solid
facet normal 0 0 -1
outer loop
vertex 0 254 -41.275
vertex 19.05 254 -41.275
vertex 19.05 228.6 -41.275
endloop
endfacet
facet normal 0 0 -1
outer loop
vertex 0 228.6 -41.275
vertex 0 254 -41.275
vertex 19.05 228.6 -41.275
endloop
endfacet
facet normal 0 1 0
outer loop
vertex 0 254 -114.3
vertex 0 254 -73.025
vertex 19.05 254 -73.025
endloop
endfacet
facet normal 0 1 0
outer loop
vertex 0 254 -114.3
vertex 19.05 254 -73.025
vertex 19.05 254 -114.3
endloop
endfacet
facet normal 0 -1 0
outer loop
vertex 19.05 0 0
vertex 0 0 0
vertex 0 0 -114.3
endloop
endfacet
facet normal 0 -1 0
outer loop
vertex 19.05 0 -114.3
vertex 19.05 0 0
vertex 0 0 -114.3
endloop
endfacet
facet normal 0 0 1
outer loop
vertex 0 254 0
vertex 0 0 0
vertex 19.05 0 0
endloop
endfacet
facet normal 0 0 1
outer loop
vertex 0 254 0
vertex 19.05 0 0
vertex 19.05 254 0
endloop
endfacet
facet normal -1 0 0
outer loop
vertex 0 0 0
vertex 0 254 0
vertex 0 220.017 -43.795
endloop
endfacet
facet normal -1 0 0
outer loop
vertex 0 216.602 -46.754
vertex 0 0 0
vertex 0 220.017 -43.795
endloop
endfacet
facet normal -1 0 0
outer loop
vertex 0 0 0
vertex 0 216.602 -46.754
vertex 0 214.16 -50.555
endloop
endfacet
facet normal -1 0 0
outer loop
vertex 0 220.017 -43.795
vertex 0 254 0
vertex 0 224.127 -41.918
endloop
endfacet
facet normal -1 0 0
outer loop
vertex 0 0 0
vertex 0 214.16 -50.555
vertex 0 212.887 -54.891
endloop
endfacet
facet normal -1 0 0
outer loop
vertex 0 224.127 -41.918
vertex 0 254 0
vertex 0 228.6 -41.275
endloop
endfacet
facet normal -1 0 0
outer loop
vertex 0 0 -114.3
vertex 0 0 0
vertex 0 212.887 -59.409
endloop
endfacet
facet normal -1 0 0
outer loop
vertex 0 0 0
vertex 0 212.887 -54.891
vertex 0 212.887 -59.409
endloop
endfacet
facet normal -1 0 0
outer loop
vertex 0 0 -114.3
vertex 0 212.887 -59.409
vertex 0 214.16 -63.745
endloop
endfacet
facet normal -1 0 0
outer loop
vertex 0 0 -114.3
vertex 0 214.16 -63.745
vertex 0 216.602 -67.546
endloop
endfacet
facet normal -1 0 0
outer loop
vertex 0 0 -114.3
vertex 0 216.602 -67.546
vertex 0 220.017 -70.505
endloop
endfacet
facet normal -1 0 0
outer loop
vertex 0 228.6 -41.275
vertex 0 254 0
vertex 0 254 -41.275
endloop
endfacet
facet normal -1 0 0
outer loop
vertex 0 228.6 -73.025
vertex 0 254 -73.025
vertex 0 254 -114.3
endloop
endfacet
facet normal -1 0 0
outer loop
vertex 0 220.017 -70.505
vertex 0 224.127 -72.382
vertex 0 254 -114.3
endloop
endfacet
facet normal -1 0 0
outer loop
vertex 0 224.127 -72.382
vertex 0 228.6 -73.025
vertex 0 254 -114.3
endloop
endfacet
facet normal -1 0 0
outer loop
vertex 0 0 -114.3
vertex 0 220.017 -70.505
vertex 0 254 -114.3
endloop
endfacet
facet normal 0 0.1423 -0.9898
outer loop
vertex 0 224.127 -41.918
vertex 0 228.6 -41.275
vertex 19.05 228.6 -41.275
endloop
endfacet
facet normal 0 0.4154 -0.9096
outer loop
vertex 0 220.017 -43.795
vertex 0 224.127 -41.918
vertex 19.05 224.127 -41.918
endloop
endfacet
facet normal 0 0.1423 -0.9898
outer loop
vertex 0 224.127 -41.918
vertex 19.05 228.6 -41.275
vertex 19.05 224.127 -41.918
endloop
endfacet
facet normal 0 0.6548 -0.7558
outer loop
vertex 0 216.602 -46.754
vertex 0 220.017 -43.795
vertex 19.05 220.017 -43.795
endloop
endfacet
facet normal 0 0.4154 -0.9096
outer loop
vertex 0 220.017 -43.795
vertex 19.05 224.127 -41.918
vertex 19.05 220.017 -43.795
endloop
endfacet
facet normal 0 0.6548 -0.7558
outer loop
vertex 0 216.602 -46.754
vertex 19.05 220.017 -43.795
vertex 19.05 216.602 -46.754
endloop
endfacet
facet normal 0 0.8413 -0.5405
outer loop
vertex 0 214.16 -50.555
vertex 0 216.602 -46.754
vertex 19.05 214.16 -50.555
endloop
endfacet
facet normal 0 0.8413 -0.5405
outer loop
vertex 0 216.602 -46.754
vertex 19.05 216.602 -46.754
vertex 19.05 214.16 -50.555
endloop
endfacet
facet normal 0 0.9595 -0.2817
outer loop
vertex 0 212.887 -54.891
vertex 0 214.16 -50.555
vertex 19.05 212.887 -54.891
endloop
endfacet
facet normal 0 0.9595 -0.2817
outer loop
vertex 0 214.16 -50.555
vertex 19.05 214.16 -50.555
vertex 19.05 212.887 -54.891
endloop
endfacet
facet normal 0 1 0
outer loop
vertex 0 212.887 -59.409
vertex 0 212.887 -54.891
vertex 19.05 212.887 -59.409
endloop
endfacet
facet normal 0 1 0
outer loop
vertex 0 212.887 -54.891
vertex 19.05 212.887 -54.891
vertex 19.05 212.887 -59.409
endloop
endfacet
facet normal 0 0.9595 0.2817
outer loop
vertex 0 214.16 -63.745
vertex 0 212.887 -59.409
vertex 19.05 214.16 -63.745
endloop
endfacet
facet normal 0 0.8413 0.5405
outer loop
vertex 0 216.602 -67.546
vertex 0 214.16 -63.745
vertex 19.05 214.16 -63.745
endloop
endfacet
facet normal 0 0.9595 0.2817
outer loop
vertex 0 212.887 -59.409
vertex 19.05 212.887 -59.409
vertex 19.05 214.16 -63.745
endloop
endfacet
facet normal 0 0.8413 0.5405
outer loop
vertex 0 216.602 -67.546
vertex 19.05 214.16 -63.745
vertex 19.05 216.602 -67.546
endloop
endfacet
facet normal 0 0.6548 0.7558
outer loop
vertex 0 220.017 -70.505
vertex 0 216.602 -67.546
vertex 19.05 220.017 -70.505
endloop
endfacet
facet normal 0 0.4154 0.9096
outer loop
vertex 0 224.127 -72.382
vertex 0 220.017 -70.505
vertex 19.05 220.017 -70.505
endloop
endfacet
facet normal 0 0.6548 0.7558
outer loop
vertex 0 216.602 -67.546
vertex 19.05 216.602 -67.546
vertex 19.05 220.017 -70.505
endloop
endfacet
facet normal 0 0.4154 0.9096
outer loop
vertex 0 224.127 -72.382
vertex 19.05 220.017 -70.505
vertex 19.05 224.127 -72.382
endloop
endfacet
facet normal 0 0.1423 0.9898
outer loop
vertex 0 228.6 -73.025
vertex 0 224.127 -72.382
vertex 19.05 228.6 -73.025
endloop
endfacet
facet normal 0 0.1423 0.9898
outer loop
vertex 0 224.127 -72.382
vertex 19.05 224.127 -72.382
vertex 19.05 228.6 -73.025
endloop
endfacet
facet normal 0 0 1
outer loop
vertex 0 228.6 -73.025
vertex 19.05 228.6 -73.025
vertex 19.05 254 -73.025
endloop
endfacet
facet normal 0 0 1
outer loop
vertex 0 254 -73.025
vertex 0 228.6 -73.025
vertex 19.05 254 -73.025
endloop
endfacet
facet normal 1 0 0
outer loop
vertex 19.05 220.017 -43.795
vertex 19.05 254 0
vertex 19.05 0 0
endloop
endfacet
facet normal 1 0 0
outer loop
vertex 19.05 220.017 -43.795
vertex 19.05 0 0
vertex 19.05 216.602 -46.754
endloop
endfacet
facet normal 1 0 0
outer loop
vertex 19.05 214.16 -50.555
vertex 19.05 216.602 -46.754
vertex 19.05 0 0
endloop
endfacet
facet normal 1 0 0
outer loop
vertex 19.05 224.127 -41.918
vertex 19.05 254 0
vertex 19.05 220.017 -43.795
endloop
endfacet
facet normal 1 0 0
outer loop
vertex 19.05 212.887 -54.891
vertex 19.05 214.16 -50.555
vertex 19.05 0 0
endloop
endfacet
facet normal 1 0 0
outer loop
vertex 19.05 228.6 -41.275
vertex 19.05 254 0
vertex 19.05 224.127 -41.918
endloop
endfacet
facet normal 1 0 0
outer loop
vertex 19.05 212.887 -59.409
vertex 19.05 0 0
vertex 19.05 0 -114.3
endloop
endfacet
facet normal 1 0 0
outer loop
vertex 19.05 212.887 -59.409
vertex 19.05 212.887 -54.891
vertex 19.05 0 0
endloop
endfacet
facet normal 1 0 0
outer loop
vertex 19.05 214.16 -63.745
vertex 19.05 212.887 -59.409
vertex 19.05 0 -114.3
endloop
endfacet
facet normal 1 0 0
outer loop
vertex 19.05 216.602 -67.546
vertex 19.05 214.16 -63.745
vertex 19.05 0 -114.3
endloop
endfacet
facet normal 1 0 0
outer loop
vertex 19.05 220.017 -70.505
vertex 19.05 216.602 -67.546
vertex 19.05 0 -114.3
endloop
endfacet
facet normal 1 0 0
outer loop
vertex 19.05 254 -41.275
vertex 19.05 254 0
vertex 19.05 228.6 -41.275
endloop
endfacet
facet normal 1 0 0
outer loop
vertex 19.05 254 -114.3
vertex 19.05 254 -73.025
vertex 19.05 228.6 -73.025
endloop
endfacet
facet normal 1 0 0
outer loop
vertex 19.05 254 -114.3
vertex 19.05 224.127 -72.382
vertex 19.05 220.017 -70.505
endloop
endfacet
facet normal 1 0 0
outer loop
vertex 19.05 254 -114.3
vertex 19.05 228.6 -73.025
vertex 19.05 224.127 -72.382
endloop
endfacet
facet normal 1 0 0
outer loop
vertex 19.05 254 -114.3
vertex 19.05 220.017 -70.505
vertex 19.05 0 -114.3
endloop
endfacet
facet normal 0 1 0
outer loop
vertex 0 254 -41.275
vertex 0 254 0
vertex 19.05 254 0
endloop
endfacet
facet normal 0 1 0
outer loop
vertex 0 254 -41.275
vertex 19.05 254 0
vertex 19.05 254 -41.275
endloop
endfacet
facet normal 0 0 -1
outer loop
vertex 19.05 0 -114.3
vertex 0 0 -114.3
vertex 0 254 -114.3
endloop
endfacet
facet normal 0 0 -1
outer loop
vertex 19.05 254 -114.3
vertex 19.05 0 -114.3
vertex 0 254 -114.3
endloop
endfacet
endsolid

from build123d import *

# Parameters (mm, degrees)
SKETCH2_W           = 114.3
SKETCH2_H           = 254
BOSS_EXTRUDE1_DEPTH = 19.05
CUT_EXTRUDE1_DEPTH  = 280.1834388


with BuildPart() as part:
    # Sketch2 → Boss-Extrude1 (new body)
    with BuildSketch(Plane(origin=(0, 0, 0), x_dir=(0, 0, -1), z_dir=(1, 0, 0))):
        with Locations((57.15, 127)):
            Rectangle(SKETCH2_W, SKETCH2_H)
    extrude(amount=BOSS_EXTRUDE1_DEPTH)

    # Sketch3 → Cut-Extrude1 (cut, through all)
    with BuildSketch(Plane(origin=(19.05, 0, 0), x_dir=(0, 0, -1), z_dir=(1, 0, 0))):
        with BuildLine():
            Line((73.025, 254), (41.275, 254))
            Line((41.275, 254), (41.275, 228.6))
            ThreePointArc((41.275, 228.6), (57.15, 212.725), (73.025, 228.6))
            Line((73.025, 228.6), (73.025, 254))
        make_face()
    extrude(amount=-CUT_EXTRUDE1_DEPTH, mode=Mode.SUBTRACT)


solid = part.part
